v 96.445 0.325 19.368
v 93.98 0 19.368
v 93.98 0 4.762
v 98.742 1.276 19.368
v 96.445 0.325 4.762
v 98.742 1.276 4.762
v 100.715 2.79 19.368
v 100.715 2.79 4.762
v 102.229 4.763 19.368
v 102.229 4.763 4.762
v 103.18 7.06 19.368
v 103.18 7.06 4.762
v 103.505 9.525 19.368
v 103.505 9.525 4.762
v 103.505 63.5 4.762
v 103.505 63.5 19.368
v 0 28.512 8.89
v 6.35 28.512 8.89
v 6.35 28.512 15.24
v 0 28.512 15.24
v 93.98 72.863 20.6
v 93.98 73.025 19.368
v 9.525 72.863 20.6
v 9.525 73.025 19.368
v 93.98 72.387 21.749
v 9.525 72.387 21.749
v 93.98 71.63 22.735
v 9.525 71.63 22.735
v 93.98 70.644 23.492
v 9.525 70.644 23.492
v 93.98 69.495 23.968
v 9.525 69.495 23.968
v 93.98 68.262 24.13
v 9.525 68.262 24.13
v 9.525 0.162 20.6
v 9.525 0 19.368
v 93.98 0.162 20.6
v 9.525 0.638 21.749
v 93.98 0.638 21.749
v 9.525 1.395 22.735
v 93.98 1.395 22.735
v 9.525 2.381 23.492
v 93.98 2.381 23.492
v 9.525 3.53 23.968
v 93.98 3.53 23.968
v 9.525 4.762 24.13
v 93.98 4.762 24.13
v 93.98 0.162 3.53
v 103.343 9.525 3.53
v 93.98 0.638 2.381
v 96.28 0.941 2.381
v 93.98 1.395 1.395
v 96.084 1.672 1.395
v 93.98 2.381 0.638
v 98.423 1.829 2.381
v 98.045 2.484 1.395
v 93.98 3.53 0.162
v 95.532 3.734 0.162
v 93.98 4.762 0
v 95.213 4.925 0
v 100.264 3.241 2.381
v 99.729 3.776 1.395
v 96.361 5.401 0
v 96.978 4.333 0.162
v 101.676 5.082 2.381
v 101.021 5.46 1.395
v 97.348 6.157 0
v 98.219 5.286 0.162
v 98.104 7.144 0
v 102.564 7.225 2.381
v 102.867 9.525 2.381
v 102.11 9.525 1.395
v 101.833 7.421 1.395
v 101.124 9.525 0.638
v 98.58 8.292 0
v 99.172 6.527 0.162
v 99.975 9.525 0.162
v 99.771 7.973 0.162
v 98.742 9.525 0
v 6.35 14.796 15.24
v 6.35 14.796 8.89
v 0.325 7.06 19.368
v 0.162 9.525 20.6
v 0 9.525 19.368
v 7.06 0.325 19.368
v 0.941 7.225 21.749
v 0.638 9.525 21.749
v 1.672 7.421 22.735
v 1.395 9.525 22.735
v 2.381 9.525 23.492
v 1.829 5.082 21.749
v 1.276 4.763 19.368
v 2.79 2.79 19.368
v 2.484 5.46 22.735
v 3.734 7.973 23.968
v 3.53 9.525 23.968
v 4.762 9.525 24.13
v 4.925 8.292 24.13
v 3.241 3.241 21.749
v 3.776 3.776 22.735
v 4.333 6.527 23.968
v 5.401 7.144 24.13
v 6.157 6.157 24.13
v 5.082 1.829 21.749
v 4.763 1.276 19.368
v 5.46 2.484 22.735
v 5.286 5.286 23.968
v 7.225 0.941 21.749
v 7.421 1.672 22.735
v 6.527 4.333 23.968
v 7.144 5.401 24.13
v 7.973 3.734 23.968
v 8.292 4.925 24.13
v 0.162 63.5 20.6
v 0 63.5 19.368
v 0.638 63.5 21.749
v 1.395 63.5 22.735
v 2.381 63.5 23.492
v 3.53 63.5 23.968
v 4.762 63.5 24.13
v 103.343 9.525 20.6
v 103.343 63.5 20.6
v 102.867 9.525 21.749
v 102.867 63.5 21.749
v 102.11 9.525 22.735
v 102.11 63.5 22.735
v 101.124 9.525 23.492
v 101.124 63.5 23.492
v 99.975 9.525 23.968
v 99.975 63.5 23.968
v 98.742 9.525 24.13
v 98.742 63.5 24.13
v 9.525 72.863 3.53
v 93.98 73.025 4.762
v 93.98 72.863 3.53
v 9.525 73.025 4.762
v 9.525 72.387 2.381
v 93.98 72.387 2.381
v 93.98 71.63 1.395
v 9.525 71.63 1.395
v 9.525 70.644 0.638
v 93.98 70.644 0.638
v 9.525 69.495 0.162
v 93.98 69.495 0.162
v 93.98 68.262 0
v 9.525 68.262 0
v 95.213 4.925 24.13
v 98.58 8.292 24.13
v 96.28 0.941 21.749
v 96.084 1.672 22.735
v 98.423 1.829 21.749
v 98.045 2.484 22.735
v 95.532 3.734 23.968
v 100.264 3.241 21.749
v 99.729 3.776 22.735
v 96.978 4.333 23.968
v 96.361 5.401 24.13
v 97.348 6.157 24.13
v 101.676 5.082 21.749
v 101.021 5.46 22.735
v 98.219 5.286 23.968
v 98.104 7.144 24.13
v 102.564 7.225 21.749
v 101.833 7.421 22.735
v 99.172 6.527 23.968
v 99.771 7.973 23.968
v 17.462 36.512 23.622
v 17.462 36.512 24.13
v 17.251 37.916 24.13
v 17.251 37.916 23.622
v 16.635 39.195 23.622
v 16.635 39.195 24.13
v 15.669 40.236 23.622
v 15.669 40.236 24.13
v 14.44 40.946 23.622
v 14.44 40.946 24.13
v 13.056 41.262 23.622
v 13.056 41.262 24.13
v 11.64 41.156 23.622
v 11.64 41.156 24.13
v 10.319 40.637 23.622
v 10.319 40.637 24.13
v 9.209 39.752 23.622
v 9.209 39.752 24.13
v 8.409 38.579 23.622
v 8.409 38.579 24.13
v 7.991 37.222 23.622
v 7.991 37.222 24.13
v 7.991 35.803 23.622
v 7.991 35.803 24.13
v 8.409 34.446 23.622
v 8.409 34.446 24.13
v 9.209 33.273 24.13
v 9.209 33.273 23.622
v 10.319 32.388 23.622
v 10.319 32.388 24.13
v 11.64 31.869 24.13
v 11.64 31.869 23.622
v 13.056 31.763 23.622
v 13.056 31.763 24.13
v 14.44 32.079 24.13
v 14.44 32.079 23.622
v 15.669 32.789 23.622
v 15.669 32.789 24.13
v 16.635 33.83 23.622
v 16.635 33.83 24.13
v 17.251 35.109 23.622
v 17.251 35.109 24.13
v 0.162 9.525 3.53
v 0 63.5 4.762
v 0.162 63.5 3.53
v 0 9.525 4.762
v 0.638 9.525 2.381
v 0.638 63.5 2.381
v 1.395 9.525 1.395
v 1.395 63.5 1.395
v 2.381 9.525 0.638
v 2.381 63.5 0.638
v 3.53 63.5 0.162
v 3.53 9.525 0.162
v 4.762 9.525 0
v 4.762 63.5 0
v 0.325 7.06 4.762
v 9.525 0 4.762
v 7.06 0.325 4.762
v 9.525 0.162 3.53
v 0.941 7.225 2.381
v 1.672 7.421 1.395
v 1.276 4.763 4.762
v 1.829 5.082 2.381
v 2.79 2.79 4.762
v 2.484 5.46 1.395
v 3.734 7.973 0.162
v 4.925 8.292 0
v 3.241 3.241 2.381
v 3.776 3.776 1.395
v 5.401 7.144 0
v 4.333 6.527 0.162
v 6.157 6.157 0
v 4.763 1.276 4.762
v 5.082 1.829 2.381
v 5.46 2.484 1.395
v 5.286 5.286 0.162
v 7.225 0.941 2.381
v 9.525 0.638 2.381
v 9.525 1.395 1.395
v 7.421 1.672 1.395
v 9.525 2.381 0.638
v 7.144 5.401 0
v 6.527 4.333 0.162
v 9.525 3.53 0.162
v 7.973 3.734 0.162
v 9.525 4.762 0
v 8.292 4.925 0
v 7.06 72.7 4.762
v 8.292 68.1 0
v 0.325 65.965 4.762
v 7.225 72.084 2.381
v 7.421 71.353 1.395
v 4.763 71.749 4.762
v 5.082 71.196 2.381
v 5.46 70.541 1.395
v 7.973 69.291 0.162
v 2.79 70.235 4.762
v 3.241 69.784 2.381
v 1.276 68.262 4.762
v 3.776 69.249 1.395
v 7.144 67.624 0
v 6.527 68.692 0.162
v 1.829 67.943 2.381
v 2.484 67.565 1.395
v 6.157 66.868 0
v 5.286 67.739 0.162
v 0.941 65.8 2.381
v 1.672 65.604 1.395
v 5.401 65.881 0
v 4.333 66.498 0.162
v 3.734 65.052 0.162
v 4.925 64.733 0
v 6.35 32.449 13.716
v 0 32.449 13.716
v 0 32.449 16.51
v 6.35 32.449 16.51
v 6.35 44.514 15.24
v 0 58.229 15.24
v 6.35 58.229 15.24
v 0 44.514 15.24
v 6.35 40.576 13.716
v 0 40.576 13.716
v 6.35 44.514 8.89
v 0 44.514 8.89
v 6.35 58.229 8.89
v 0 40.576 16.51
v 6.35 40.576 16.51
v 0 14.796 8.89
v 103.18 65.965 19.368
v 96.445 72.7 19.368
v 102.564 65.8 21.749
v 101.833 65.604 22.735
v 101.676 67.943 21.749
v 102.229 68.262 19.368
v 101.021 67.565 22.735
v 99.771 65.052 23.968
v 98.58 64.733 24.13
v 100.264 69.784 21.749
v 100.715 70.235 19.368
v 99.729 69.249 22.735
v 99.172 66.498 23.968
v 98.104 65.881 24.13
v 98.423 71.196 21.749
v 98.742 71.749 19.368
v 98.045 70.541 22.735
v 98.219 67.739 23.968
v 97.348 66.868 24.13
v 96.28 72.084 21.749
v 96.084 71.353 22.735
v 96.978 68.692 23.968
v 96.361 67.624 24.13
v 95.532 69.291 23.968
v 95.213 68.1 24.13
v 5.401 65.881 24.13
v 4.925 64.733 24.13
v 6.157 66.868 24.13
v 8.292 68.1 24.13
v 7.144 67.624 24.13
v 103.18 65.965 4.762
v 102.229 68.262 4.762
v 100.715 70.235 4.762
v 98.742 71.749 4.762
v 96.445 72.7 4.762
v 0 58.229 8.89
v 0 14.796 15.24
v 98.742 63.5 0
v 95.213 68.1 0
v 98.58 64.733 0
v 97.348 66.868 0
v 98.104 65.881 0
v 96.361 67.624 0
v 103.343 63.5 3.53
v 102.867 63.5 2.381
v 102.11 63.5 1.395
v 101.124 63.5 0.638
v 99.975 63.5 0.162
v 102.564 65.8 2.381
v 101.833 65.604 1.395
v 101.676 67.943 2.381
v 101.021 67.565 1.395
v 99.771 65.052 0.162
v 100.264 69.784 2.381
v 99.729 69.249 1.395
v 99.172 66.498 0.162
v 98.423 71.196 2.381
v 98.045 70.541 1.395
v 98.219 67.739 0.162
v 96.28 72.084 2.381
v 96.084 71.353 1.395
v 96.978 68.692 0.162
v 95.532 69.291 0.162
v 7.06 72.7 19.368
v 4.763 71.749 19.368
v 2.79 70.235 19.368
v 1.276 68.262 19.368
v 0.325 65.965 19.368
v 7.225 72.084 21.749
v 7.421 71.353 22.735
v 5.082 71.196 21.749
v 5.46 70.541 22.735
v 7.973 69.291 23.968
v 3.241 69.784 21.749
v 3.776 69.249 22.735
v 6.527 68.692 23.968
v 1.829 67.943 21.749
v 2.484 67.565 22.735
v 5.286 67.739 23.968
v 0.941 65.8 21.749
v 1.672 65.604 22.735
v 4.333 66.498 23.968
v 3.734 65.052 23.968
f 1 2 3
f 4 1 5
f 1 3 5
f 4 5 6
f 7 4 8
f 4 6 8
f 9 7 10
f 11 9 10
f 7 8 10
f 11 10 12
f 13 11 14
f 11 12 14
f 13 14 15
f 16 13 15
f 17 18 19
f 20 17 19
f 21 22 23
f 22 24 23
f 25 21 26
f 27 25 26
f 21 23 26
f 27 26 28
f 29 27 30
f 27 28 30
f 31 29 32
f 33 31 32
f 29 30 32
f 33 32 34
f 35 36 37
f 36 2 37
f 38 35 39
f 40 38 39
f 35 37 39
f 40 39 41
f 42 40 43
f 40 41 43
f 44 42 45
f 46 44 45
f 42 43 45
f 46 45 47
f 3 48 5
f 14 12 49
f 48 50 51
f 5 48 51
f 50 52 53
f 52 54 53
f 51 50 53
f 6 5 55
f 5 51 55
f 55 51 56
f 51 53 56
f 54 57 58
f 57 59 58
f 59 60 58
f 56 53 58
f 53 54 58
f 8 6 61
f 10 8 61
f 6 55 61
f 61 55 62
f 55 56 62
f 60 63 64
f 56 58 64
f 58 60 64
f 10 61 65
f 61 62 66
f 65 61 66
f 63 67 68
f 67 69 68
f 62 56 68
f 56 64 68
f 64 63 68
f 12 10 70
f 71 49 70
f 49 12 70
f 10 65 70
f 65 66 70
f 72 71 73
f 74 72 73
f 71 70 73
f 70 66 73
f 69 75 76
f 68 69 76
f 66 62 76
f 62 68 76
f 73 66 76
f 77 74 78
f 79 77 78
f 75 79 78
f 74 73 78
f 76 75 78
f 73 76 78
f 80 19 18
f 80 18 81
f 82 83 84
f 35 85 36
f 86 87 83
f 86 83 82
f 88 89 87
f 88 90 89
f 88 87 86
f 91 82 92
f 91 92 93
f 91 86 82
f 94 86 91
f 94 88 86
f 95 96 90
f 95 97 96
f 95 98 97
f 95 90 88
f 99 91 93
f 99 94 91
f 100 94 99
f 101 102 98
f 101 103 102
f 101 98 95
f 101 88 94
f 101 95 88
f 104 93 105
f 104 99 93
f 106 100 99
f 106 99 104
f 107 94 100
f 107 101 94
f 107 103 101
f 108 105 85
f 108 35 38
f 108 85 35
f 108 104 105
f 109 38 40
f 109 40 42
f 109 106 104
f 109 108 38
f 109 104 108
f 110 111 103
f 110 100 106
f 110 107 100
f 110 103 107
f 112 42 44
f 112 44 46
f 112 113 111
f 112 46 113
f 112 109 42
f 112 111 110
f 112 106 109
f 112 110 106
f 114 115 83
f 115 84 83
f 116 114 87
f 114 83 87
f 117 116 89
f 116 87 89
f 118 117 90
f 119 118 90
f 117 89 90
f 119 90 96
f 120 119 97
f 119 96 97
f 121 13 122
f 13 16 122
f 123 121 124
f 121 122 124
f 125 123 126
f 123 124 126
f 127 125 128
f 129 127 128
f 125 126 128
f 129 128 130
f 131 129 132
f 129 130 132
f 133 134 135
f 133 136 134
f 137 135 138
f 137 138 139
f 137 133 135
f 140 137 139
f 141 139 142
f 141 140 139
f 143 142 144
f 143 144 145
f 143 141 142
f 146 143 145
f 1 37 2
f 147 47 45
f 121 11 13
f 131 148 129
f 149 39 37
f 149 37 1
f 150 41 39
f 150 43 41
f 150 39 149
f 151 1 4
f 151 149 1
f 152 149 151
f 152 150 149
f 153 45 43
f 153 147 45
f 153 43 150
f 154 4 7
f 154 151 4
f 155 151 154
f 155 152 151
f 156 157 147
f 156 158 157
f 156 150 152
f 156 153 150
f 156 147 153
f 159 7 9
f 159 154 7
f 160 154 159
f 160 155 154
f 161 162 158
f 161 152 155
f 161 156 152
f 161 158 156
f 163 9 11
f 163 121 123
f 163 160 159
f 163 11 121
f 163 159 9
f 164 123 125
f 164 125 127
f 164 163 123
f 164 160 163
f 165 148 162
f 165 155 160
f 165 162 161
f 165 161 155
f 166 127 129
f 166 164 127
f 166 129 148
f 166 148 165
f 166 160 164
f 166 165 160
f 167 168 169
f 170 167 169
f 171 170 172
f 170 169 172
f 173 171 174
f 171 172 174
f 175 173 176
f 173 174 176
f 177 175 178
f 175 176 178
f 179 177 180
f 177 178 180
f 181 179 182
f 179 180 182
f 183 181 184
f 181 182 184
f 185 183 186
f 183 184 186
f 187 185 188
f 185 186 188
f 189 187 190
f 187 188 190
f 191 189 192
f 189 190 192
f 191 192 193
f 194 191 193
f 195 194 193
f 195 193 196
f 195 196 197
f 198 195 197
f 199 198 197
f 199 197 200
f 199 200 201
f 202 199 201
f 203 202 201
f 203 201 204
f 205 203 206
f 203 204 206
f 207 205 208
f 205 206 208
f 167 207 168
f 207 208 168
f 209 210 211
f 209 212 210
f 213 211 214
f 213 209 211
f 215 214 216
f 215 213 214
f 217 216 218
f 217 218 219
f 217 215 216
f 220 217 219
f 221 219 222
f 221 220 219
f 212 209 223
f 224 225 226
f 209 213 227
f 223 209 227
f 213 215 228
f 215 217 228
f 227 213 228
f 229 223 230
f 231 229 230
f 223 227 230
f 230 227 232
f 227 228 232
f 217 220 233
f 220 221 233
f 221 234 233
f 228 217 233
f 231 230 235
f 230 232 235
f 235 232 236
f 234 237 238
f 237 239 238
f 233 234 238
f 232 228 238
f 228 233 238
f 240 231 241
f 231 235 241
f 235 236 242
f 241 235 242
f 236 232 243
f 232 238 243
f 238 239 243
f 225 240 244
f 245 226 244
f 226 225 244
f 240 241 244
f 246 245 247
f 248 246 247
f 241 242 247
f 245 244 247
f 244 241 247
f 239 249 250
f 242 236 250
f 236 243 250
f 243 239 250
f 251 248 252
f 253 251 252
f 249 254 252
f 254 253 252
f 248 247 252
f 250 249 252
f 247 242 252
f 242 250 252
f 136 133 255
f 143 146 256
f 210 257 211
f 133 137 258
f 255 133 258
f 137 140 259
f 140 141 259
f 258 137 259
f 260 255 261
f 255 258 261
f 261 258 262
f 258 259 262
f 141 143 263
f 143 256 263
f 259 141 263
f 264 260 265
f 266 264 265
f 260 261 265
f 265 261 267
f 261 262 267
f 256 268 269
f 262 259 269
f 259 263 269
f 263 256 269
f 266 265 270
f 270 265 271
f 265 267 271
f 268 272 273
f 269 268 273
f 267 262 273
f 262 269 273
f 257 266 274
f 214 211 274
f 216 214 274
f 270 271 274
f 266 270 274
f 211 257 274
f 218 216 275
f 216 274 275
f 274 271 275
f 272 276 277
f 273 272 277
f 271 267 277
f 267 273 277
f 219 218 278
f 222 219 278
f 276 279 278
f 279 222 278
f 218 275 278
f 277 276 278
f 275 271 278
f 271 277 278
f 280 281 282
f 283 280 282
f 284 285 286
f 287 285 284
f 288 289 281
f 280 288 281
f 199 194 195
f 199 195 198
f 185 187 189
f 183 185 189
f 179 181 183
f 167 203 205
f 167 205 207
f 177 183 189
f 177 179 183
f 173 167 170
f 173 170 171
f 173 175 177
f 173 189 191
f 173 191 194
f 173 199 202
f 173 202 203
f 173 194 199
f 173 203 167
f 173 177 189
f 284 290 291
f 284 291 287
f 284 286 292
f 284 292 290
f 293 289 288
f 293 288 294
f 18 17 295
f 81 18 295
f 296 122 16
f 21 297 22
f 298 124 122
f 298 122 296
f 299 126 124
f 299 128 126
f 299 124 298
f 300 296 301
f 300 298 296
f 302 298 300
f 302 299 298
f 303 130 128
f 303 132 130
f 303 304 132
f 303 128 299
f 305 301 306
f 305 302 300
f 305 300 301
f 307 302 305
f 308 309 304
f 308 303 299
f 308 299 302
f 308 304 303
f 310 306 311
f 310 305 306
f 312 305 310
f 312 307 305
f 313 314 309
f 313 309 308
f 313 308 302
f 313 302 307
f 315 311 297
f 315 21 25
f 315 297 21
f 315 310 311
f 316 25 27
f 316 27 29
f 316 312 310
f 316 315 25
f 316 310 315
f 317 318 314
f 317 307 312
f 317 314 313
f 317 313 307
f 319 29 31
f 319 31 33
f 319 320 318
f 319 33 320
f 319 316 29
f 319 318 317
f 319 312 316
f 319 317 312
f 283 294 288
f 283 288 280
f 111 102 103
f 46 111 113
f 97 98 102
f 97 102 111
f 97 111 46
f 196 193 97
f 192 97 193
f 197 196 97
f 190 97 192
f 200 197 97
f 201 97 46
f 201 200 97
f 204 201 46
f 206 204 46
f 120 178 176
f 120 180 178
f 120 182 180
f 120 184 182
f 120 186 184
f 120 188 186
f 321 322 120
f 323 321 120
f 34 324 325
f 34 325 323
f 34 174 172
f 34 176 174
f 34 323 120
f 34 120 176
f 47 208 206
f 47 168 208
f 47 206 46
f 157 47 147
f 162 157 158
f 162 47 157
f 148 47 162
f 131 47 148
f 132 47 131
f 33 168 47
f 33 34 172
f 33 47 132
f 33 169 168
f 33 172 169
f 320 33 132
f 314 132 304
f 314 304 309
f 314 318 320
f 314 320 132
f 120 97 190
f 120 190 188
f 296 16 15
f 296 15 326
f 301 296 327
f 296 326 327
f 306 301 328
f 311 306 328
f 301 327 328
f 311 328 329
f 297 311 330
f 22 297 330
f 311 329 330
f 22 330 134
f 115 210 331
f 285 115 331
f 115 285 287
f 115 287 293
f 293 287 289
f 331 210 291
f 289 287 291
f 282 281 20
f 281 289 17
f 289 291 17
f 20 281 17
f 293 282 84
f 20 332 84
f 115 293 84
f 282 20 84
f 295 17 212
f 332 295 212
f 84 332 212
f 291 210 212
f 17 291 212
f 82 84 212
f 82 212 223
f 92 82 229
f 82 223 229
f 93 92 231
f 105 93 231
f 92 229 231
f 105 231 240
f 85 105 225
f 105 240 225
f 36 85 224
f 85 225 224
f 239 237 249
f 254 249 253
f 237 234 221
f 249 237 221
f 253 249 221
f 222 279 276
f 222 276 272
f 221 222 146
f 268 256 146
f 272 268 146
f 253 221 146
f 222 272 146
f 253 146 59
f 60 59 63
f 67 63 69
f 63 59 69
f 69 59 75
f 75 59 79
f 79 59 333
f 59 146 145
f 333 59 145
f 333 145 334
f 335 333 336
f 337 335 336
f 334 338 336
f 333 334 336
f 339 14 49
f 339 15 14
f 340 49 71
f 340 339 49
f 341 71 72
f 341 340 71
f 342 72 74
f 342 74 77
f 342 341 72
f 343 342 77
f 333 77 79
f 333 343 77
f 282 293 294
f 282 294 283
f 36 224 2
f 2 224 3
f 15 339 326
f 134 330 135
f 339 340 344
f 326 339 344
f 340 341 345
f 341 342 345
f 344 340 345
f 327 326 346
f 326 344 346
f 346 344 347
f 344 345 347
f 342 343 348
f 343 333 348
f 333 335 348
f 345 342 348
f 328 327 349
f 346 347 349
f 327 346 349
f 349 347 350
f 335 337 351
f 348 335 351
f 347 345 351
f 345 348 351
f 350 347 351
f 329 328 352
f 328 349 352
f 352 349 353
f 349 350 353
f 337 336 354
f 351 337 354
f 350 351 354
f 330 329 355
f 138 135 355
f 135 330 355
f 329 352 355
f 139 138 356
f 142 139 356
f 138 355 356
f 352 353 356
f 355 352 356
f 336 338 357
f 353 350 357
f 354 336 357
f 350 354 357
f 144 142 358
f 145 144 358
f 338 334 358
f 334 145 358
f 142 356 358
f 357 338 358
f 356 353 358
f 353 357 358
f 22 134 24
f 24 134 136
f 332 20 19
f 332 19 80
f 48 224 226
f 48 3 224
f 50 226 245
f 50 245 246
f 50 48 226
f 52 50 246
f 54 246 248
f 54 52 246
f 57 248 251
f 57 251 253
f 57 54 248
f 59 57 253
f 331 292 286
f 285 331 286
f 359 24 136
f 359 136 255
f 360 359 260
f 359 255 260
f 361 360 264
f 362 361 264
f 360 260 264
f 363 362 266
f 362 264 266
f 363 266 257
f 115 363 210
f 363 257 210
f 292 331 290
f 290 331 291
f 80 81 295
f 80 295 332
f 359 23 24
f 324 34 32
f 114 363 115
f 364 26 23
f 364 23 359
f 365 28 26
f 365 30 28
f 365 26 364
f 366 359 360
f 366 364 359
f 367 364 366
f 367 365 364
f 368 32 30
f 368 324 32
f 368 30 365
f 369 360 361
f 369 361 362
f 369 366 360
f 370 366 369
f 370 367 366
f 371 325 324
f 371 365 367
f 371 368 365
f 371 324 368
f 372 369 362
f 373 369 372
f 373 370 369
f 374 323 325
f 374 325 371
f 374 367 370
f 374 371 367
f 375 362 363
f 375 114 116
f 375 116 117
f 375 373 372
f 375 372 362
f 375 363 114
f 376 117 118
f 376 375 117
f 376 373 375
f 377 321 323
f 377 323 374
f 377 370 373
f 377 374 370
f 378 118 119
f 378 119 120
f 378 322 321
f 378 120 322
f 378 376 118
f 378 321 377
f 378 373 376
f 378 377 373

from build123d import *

# Parameters (mm, degrees)
F1_DEPTH = 24.13
F2_R     = 4.7625
F3_R     = 4.7625
F4_DEPTH = 0.508
F5_W     = 13.716
F5_H     = 6.35
F5_W_2   = 8.128
F5_H_2   = 2.794
F6_DEPTH = 6.35


with BuildPart() as f1:
    # F0 (on Top) → F1 (new body)
    with BuildSketch(Plane.XY):
        with BuildLine():
            ThreePointArc((0, 9.525), (2.789808, 2.789808), (9.525, 0))
            Line((9.525, 0), (93.98, 0))
            ThreePointArc((93.98, 0), (100.715192, 2.789808), (103.505, 9.525))
            Line((103.505, 9.525), (103.505, 63.5))
            ThreePointArc((103.505, 63.5), (100.715192, 70.235192), (93.98, 73.025))
            Line((93.98, 73.025), (9.525, 73.025))
            ThreePointArc((9.525, 73.025), (2.789808, 70.235192), (0, 63.5))
            Line((0, 63.5), (0, 9.525))
        make_face()
    extrude(amount=F1_DEPTH)

    # F2
    f2_edges = [f1.edges().sort_by_distance(p)[0] for p in [
        (0, 36.5125, 24.13),
        (2.789808, 2.789808, 24.13),
        (51.7525, 0, 24.13),
        (100.715192, 2.789808, 24.13),
        (103.505, 36.5125, 24.13),
        (100.715192, 70.235192, 24.13),
        (51.7525, 73.025, 24.13),
        (2.789808, 70.235192, 24.13),
        (0, 36.5125, 0),
        (2.789808, 2.789808, 0),
        (51.7525, 0, 0),
        (100.715192, 2.789808, 0),
        (103.505, 36.5125, 0),
        (100.715192, 70.235192, 0),
        (51.7525, 73.025, 0),
        (2.789808, 70.235192, 0),
    ]]
    fillet(f2_edges, radius=F2_R)

    # F3 (on face) → F4 (cut)
    with BuildSketch(Plane.XY.offset(24.13)):
        with Locations((12.7, 36.5125)):
            Circle(F3_R)
    extrude(amount=-F4_DEPTH, mode=Mode.SUBTRACT)

    # F5 (on face) → F6 (cut)
    with BuildSketch(Plane(origin=(0, 0, 0), x_dir=(0, -1, 0), z_dir=(-1, 0, 0))):
        with Locations((-51.3715, 12.065)):
            Rectangle(F5_W, F5_H)
        with Locations((-36.5125, 15.113)):
            Rectangle(F5_W_2, F5_H_2)
        with Locations((-21.6535, 12.065)):
            Rectangle(F5_W, F5_H)
    extrude(amount=-F6_DEPTH, mode=Mode.SUBTRACT)


solid = f1.part
